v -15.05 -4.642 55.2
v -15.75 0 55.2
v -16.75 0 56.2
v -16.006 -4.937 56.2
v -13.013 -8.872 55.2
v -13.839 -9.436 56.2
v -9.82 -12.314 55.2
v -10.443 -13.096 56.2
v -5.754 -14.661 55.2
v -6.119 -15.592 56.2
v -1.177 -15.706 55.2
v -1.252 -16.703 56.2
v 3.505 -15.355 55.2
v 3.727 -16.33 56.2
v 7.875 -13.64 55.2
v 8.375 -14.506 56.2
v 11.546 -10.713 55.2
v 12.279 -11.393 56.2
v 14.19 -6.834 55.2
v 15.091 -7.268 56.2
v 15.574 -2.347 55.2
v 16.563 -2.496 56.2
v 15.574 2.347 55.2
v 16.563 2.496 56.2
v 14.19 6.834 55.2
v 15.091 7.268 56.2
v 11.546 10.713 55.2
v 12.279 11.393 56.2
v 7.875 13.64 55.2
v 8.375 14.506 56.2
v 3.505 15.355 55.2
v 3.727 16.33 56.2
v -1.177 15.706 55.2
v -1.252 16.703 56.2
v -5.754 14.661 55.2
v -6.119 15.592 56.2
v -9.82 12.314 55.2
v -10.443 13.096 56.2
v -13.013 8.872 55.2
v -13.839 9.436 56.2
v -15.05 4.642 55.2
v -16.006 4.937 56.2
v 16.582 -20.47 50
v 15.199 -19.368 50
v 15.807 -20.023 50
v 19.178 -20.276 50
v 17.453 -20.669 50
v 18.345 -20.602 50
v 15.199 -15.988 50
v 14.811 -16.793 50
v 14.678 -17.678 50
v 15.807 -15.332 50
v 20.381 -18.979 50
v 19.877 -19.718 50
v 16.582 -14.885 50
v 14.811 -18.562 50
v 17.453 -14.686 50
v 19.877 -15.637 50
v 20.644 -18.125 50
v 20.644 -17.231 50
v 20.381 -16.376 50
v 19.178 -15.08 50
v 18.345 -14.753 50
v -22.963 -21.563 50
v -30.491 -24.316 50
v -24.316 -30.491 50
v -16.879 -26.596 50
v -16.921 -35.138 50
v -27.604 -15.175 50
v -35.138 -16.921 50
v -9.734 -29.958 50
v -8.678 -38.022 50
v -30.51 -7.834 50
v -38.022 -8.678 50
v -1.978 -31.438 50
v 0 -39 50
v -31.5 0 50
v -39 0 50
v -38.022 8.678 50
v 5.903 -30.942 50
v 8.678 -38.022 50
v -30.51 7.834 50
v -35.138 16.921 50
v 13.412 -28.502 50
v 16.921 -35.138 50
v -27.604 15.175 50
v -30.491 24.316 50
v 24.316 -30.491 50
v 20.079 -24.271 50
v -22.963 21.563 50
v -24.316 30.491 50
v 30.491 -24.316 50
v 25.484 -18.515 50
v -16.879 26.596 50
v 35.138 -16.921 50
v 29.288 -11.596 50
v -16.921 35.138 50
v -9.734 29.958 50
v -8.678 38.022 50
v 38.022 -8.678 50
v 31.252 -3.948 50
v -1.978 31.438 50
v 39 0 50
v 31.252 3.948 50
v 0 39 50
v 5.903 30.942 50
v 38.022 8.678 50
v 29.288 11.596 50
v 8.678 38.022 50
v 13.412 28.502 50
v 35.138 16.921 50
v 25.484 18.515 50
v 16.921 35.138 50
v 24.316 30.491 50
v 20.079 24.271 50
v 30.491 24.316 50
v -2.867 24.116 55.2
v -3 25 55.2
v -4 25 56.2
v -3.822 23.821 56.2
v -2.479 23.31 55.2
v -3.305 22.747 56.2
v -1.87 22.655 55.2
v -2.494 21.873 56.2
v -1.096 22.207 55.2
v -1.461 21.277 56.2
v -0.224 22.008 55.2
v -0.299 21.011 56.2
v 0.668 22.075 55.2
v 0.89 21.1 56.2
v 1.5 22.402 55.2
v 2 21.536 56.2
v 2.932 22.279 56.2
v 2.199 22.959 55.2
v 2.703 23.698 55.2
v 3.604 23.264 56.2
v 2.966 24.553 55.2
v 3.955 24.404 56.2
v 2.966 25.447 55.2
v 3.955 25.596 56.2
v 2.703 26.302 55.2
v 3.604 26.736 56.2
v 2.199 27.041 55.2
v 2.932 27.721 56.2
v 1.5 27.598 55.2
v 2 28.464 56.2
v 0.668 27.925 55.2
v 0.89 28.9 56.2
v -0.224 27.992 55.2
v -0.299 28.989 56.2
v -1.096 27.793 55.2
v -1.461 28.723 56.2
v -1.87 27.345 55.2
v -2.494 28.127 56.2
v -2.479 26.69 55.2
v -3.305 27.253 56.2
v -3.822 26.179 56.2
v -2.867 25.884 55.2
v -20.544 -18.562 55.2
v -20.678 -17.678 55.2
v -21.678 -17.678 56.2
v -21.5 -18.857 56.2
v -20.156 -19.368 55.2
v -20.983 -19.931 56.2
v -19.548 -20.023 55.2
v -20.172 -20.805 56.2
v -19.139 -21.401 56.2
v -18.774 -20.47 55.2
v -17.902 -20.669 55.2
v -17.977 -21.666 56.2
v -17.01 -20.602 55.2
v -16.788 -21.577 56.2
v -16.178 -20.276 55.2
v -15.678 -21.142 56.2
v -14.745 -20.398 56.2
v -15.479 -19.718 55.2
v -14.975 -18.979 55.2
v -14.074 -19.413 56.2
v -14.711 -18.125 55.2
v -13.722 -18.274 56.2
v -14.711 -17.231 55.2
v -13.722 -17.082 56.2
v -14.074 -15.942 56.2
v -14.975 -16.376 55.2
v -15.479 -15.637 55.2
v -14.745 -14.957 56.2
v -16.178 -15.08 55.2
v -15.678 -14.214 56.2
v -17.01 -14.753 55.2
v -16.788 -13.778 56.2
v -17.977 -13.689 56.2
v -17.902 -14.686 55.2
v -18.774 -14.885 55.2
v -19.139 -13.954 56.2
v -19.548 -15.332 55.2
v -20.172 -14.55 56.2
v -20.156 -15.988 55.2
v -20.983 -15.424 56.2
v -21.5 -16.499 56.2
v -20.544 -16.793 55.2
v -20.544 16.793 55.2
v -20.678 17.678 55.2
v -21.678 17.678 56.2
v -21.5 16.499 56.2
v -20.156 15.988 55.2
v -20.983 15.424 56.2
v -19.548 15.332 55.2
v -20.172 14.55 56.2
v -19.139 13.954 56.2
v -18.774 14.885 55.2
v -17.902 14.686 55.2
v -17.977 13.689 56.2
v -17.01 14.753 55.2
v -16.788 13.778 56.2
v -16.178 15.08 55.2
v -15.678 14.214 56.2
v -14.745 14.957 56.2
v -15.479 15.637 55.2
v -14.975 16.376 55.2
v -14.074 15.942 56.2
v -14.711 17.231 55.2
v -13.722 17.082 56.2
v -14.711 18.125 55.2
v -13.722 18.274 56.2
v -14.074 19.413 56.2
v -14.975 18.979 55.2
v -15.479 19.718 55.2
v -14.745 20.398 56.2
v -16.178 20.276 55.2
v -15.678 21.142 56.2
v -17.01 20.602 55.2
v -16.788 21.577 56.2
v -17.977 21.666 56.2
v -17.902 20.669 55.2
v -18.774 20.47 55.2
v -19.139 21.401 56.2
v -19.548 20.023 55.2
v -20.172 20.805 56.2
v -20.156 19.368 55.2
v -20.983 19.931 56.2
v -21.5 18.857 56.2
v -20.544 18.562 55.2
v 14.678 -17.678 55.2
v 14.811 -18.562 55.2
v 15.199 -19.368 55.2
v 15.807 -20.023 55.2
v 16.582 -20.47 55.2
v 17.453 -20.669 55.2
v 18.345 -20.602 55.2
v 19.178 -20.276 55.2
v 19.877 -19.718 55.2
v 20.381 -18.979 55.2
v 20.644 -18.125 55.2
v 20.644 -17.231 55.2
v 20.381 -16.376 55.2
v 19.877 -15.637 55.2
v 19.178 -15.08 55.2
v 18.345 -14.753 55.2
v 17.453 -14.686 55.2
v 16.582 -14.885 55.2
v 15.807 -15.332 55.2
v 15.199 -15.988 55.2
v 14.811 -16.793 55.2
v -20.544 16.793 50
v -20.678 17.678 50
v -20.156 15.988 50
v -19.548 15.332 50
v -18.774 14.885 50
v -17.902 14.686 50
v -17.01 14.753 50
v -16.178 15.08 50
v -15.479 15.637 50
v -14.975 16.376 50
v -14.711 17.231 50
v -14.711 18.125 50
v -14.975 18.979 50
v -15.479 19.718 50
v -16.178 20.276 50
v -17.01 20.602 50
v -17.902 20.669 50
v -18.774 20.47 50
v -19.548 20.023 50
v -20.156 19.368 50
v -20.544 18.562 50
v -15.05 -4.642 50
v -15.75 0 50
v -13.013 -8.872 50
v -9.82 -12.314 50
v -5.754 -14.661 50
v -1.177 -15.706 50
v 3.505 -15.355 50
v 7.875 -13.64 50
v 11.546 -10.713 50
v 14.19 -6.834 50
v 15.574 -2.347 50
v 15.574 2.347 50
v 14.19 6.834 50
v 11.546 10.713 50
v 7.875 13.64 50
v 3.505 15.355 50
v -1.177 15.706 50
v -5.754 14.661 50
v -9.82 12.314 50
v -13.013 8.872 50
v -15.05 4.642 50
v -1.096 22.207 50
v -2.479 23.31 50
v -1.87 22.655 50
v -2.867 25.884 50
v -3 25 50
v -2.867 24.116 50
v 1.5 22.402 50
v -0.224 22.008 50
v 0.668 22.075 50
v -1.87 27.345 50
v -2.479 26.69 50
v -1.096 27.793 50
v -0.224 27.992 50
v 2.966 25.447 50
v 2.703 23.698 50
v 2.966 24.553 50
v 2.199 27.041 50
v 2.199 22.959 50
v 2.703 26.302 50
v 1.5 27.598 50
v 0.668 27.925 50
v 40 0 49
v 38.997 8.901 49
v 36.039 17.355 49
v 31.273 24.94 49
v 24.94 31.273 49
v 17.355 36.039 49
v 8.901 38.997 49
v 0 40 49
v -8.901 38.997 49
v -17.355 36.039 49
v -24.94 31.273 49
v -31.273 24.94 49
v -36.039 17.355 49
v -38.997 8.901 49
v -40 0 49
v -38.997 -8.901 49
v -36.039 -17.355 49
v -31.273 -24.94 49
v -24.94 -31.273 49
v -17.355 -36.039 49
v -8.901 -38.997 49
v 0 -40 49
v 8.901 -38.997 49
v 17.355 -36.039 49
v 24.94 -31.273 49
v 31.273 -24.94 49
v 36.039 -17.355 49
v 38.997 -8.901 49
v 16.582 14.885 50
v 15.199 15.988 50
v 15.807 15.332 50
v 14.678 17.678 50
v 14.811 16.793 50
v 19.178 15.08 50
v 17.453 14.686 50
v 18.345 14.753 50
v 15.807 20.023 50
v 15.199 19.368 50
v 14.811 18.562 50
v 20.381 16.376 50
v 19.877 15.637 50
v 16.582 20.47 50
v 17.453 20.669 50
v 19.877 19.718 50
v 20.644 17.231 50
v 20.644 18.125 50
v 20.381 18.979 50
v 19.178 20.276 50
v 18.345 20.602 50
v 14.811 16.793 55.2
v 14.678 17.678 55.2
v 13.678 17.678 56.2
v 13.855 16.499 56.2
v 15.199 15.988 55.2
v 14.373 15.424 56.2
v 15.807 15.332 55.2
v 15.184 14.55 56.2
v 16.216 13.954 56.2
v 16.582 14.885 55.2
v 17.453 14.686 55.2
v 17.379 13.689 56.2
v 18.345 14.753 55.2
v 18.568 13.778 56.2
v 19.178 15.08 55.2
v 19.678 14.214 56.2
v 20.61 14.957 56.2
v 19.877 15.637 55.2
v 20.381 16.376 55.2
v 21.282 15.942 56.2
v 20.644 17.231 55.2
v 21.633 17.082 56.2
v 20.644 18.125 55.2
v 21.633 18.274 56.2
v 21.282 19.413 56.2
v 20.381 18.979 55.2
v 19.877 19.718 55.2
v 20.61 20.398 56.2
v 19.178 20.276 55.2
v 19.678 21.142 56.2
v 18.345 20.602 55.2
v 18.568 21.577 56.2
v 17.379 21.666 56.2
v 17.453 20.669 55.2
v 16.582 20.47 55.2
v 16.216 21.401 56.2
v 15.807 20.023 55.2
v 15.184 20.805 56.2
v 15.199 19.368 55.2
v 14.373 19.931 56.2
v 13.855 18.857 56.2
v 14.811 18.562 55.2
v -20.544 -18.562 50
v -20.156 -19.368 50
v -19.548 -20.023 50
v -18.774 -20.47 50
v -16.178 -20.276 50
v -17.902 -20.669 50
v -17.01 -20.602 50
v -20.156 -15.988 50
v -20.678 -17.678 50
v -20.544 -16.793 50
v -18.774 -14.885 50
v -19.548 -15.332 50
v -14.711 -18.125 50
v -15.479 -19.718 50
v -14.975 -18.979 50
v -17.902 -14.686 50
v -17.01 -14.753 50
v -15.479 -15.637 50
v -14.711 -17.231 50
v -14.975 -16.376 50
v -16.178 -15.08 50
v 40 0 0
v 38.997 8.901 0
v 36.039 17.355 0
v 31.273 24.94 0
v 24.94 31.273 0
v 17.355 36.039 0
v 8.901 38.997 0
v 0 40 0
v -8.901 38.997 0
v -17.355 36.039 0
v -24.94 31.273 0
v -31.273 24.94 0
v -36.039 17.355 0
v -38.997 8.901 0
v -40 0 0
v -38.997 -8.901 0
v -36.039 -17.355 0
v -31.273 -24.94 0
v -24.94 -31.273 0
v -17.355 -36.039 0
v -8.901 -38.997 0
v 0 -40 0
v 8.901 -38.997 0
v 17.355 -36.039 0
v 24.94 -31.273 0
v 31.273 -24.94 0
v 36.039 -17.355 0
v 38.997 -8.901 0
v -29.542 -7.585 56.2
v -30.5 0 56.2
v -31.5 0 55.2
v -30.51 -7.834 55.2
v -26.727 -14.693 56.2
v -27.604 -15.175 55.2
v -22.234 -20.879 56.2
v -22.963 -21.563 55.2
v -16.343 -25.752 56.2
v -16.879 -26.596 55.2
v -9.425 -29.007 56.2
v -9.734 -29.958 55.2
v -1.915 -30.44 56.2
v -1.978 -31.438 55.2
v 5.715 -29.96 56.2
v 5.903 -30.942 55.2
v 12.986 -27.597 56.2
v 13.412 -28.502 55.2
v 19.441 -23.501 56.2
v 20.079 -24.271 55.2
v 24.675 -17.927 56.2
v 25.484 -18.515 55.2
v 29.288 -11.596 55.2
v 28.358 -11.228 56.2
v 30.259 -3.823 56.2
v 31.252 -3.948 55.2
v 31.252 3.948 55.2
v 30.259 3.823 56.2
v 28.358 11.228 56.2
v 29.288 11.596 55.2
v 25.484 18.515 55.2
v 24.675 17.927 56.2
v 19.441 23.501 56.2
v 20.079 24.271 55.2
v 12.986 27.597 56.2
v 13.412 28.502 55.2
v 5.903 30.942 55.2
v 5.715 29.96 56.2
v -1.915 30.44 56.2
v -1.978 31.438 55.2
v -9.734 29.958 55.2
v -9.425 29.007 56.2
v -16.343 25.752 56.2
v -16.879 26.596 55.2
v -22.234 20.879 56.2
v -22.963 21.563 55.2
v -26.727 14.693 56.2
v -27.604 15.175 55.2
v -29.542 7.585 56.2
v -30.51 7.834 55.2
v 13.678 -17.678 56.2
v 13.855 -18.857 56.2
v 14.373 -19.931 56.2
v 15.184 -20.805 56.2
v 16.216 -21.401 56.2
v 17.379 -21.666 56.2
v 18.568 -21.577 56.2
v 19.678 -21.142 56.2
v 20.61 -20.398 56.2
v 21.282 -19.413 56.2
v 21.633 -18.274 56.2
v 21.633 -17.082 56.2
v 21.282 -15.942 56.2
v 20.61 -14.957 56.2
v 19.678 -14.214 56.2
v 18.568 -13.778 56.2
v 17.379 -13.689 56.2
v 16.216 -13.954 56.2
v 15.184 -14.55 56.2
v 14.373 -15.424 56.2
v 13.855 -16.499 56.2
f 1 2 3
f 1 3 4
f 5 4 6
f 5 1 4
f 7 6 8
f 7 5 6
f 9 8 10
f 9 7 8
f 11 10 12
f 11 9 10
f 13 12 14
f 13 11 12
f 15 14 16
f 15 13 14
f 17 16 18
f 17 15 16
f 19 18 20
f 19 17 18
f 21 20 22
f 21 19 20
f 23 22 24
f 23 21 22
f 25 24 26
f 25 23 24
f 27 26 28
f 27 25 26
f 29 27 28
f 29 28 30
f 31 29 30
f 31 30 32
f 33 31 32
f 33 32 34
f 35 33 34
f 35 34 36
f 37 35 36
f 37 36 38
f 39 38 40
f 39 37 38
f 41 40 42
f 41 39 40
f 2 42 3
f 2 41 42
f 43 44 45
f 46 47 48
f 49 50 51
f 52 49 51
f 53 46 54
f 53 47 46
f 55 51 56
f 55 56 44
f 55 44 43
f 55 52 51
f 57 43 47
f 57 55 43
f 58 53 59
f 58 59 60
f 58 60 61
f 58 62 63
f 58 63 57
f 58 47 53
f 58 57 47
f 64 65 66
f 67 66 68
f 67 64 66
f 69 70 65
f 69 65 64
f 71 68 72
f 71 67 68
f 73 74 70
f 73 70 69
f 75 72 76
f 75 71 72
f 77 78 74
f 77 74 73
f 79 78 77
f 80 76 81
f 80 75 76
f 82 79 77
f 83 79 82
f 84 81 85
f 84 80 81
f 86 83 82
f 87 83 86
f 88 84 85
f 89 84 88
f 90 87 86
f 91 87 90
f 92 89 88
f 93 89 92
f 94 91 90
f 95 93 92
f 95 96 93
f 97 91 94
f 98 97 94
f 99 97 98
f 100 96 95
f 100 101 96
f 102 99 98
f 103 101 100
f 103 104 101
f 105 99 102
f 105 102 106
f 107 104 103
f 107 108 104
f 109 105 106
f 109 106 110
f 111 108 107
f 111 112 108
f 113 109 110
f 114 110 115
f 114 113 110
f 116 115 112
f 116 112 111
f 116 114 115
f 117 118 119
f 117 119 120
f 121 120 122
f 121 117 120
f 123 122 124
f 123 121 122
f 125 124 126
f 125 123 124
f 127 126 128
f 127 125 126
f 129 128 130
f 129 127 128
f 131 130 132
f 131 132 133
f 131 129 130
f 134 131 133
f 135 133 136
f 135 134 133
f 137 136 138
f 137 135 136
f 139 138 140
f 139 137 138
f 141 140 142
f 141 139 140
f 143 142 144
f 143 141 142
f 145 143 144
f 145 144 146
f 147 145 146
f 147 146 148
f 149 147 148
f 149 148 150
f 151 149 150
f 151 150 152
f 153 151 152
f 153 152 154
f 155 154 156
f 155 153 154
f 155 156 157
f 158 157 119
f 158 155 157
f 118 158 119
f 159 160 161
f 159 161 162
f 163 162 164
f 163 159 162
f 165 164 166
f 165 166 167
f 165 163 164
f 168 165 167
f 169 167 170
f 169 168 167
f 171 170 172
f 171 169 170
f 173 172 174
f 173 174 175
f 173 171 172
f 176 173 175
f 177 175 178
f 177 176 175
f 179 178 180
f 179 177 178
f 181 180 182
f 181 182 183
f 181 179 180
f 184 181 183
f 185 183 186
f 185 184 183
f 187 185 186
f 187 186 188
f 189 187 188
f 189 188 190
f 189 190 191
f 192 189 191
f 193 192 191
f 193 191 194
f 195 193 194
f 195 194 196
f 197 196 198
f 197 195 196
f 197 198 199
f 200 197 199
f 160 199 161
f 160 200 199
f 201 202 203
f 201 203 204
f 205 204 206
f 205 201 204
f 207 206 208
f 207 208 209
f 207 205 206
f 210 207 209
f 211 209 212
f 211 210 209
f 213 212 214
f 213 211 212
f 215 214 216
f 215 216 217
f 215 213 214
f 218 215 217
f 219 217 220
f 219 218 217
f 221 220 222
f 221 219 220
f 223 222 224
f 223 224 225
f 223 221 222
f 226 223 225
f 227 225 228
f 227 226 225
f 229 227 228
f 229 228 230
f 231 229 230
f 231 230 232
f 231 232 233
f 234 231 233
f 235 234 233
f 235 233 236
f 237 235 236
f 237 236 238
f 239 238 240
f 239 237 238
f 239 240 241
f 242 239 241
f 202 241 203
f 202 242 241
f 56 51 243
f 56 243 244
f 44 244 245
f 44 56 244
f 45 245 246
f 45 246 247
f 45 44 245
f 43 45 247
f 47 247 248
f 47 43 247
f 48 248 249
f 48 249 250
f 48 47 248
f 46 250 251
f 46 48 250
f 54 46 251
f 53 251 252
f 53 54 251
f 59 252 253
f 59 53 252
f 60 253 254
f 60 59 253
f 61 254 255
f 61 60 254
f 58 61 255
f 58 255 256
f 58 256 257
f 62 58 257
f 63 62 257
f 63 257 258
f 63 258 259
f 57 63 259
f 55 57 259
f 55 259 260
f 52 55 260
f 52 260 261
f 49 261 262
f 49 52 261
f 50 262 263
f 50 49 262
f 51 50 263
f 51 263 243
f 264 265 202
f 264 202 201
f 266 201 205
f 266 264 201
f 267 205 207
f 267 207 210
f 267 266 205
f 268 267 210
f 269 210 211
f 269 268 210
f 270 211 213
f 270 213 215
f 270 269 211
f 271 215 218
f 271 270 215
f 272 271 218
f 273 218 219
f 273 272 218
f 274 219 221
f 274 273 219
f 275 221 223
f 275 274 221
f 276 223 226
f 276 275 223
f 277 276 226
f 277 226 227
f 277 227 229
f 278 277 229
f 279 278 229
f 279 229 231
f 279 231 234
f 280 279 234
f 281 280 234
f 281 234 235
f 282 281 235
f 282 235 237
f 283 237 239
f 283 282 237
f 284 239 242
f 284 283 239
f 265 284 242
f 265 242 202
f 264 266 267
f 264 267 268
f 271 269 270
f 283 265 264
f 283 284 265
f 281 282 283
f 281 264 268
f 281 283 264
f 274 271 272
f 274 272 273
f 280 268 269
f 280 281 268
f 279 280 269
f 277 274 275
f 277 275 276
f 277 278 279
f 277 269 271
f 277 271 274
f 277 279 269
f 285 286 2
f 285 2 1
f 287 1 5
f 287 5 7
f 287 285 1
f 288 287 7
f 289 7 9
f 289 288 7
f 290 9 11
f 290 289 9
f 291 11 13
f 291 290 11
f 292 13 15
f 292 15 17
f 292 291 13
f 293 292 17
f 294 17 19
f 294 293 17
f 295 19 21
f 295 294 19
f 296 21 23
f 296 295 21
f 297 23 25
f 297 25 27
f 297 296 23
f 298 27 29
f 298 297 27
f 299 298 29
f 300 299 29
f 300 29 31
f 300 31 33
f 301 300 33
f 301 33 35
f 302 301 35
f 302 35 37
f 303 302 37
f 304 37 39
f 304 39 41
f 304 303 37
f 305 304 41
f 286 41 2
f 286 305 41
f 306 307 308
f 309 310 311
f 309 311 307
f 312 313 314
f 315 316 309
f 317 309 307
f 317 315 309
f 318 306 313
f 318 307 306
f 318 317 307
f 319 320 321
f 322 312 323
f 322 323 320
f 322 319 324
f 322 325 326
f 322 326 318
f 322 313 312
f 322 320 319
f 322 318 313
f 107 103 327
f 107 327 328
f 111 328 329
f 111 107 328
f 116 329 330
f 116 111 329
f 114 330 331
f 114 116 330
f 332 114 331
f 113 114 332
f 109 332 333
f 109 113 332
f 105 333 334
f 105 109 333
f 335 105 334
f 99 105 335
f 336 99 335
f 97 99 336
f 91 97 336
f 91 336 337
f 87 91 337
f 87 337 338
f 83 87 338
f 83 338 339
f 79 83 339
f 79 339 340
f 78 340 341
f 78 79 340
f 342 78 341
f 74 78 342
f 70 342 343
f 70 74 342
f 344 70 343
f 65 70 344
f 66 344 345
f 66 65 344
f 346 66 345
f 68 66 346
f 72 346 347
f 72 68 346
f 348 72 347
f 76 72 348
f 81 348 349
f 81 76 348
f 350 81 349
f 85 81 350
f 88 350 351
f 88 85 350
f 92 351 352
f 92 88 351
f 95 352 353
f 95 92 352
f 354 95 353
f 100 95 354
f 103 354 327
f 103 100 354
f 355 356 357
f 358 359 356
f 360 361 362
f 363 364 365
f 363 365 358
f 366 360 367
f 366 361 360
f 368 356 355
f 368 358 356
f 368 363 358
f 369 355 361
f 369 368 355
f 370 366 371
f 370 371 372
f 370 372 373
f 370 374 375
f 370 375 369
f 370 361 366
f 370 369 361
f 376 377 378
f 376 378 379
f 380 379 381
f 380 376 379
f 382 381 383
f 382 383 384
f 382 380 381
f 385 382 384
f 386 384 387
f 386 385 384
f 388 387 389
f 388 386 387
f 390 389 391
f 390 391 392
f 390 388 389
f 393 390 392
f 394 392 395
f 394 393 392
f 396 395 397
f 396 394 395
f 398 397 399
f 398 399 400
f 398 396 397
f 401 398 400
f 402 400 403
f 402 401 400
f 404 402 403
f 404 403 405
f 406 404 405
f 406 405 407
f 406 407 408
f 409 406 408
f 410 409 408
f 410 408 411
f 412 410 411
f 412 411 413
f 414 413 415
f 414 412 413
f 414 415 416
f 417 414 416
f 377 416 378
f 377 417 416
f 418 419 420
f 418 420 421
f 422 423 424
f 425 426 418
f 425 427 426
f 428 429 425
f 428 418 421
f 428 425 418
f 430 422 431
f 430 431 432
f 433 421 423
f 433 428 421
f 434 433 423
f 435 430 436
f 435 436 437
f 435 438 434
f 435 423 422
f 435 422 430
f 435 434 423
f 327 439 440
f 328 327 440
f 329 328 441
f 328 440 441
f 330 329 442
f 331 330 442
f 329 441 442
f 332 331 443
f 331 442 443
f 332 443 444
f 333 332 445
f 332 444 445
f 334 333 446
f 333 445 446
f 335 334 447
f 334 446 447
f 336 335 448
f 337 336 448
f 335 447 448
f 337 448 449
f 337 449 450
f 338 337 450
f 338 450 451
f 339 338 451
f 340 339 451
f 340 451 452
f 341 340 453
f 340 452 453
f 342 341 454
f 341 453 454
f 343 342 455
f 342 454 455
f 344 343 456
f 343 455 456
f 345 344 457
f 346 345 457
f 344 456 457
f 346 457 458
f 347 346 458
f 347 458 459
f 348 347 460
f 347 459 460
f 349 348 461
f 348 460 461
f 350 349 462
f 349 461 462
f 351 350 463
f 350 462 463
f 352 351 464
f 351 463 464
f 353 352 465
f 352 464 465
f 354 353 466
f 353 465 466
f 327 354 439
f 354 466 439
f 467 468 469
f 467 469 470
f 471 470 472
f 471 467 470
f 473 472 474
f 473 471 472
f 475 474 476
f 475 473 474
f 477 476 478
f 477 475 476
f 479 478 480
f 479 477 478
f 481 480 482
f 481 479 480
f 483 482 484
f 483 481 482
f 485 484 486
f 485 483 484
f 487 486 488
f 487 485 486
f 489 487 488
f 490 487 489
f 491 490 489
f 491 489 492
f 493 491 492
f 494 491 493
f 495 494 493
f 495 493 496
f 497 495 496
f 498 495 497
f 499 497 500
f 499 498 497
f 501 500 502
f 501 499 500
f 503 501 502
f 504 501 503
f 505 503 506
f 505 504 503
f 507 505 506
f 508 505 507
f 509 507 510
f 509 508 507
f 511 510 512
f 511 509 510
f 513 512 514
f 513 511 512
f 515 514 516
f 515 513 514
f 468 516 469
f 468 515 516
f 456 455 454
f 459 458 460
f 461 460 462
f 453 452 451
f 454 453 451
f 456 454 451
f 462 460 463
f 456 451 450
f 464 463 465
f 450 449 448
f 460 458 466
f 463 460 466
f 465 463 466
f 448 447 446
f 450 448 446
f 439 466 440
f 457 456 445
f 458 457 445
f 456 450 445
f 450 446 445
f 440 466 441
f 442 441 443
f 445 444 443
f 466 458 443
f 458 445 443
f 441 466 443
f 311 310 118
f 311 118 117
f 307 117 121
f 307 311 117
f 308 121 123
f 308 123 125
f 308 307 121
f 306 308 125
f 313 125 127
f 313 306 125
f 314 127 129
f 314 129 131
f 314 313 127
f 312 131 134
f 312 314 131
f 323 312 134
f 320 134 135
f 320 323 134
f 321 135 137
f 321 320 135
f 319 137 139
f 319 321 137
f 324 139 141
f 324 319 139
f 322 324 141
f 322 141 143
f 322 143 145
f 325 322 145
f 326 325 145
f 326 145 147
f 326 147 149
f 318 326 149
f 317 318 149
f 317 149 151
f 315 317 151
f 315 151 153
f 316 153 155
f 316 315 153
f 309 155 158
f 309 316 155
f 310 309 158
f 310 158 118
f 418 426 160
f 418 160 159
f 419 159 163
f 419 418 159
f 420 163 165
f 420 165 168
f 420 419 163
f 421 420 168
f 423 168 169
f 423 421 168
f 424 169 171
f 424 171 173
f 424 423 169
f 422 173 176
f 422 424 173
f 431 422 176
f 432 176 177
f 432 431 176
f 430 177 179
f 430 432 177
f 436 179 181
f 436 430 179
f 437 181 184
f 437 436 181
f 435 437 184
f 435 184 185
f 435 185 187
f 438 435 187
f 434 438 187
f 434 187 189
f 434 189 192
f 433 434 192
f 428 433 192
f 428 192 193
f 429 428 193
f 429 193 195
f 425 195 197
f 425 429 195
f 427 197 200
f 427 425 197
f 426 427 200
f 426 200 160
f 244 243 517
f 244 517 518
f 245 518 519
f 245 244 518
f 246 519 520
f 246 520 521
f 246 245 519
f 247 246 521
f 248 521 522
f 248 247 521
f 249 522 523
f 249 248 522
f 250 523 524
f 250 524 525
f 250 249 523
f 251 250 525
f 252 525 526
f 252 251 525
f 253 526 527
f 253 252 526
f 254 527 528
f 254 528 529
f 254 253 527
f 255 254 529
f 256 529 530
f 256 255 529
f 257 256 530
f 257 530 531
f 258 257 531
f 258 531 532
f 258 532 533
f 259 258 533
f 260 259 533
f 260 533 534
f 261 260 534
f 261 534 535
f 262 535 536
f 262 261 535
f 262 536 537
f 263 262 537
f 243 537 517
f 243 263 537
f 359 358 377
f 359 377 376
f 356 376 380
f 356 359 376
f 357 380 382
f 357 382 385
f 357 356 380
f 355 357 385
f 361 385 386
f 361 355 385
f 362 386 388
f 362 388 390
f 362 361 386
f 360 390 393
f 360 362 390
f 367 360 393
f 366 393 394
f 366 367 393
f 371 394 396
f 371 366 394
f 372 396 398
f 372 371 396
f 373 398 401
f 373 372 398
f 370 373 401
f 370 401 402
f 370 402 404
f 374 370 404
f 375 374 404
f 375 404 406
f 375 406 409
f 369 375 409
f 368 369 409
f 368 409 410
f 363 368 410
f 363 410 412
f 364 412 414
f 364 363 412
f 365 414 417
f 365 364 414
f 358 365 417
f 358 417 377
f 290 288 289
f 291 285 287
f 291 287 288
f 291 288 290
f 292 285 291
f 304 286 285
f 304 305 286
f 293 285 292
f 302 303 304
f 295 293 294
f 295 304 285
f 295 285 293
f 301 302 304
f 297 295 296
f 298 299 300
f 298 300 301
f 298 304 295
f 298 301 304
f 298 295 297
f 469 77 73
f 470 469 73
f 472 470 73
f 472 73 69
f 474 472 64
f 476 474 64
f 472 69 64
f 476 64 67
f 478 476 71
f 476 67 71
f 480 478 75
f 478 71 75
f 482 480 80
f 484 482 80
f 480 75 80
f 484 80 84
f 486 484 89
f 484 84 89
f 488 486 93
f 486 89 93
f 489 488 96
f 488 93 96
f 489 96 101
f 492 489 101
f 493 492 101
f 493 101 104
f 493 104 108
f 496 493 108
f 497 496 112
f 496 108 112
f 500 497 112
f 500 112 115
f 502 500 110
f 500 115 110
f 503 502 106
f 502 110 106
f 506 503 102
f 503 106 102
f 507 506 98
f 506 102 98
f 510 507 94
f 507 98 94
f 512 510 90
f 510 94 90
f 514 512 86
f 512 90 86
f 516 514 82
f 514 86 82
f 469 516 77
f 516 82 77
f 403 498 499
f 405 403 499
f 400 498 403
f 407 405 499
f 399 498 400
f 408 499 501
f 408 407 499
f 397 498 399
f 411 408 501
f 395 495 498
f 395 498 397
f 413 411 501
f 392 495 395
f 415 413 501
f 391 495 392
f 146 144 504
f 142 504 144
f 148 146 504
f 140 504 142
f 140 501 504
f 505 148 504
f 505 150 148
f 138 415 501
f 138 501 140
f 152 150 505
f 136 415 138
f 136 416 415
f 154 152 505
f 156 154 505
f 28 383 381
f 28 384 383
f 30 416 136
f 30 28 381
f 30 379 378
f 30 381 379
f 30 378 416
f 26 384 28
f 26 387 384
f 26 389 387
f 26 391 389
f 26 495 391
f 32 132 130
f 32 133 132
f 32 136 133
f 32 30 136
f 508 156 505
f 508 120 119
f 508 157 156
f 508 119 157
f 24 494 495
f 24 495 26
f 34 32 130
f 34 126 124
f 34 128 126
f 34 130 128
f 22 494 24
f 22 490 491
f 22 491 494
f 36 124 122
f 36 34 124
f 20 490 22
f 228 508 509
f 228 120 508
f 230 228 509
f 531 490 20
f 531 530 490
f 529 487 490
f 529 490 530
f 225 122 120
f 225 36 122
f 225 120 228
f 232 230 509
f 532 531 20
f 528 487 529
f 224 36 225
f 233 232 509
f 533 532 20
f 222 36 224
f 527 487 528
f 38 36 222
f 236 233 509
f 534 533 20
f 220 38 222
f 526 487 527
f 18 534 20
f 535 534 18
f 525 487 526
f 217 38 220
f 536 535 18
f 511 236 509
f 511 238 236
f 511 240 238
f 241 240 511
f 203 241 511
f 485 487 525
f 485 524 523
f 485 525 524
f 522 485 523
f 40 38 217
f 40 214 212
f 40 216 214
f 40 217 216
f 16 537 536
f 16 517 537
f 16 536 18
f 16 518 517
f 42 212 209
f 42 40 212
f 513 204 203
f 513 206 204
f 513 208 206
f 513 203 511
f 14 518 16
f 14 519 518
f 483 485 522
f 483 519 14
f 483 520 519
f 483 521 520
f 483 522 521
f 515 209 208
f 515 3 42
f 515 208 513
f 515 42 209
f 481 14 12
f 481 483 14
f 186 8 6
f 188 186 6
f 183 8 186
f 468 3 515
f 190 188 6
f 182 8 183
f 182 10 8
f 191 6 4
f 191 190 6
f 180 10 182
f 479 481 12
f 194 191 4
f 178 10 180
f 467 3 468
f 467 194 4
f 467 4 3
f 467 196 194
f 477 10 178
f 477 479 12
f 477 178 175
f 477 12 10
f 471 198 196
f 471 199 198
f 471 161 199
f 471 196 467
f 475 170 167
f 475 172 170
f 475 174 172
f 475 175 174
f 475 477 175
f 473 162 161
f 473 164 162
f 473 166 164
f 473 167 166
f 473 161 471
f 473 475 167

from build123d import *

# Parameters (mm, degrees)
SKIZZE1_R                       = 40
AUFSATZ_LINEAR_AUSTRAGEN1_DEPTH = 50
SKIZZE2_R                       = 31.5
SKIZZE2_R_2                     = 15.75
SKIZZE2_R_3                     = 3
AUFSATZ_LINEAR_AUSTRAGEN2_DEPTH = 6.2
FASE1_SIZE                      = 1


with BuildPart() as part:
    # Skizze1 → Aufsatz-Linear austragen1 (new body)
    with BuildSketch(Plane.XY):
        Circle(SKIZZE1_R)
    extrude(amount=AUFSATZ_LINEAR_AUSTRAGEN1_DEPTH)

    # Skizze2 → Aufsatz-Linear austragen2 (add)
    with BuildSketch(Plane.XY.offset(50)):
        with Locations(Location((0, 0, 0), (0, 0, 180))):
            Circle(SKIZZE2_R)
        with Locations(Location((0, 0, 0), (0, 0, 180))):
            Circle(SKIZZE2_R_2, mode=Mode.SUBTRACT)
        with Locations(Location((0, 25, 0), (0, 0, 180))):
            Circle(SKIZZE2_R_3, mode=Mode.SUBTRACT)
        with Locations(Location((17.67766953, 17.67766953, 0), (0, 0, 180))):
            Circle(SKIZZE2_R_3, mode=Mode.SUBTRACT)
        with Locations(Location((17.67766953, -17.67766953, 0), (0, 0, 180))):
            Circle(SKIZZE2_R_3, mode=Mode.SUBTRACT)
        with Locations(Location((-17.67766953, -17.67766953, 0), (0, 0, 180))):
            Circle(SKIZZE2_R_3, mode=Mode.SUBTRACT)
        with Locations(Location((-17.67766953, 17.67766953, 0), (0, 0, 180))):
            Circle(SKIZZE2_R_3, mode=Mode.SUBTRACT)
    extrude(amount=AUFSATZ_LINEAR_AUSTRAGEN2_DEPTH)

    # Fase1
    fase1_edges = [part.edges().sort_by_distance(p)[0] for p in [
        (31.5, 0, 56.2),
        (15.75, 0, 56.2),
        (3, 25, 56.2),
        (20.67766953, 17.67766953, 56.2),
        (20.67766953, -17.67766953, 56.2),
        (-14.67766953, -17.67766953, 56.2),
        (-14.67766953, 17.67766953, 56.2),
        (-40, 0, 50),
    ]]
    chamfer(fase1_edges, length=FASE1_SIZE)


solid = part.part
